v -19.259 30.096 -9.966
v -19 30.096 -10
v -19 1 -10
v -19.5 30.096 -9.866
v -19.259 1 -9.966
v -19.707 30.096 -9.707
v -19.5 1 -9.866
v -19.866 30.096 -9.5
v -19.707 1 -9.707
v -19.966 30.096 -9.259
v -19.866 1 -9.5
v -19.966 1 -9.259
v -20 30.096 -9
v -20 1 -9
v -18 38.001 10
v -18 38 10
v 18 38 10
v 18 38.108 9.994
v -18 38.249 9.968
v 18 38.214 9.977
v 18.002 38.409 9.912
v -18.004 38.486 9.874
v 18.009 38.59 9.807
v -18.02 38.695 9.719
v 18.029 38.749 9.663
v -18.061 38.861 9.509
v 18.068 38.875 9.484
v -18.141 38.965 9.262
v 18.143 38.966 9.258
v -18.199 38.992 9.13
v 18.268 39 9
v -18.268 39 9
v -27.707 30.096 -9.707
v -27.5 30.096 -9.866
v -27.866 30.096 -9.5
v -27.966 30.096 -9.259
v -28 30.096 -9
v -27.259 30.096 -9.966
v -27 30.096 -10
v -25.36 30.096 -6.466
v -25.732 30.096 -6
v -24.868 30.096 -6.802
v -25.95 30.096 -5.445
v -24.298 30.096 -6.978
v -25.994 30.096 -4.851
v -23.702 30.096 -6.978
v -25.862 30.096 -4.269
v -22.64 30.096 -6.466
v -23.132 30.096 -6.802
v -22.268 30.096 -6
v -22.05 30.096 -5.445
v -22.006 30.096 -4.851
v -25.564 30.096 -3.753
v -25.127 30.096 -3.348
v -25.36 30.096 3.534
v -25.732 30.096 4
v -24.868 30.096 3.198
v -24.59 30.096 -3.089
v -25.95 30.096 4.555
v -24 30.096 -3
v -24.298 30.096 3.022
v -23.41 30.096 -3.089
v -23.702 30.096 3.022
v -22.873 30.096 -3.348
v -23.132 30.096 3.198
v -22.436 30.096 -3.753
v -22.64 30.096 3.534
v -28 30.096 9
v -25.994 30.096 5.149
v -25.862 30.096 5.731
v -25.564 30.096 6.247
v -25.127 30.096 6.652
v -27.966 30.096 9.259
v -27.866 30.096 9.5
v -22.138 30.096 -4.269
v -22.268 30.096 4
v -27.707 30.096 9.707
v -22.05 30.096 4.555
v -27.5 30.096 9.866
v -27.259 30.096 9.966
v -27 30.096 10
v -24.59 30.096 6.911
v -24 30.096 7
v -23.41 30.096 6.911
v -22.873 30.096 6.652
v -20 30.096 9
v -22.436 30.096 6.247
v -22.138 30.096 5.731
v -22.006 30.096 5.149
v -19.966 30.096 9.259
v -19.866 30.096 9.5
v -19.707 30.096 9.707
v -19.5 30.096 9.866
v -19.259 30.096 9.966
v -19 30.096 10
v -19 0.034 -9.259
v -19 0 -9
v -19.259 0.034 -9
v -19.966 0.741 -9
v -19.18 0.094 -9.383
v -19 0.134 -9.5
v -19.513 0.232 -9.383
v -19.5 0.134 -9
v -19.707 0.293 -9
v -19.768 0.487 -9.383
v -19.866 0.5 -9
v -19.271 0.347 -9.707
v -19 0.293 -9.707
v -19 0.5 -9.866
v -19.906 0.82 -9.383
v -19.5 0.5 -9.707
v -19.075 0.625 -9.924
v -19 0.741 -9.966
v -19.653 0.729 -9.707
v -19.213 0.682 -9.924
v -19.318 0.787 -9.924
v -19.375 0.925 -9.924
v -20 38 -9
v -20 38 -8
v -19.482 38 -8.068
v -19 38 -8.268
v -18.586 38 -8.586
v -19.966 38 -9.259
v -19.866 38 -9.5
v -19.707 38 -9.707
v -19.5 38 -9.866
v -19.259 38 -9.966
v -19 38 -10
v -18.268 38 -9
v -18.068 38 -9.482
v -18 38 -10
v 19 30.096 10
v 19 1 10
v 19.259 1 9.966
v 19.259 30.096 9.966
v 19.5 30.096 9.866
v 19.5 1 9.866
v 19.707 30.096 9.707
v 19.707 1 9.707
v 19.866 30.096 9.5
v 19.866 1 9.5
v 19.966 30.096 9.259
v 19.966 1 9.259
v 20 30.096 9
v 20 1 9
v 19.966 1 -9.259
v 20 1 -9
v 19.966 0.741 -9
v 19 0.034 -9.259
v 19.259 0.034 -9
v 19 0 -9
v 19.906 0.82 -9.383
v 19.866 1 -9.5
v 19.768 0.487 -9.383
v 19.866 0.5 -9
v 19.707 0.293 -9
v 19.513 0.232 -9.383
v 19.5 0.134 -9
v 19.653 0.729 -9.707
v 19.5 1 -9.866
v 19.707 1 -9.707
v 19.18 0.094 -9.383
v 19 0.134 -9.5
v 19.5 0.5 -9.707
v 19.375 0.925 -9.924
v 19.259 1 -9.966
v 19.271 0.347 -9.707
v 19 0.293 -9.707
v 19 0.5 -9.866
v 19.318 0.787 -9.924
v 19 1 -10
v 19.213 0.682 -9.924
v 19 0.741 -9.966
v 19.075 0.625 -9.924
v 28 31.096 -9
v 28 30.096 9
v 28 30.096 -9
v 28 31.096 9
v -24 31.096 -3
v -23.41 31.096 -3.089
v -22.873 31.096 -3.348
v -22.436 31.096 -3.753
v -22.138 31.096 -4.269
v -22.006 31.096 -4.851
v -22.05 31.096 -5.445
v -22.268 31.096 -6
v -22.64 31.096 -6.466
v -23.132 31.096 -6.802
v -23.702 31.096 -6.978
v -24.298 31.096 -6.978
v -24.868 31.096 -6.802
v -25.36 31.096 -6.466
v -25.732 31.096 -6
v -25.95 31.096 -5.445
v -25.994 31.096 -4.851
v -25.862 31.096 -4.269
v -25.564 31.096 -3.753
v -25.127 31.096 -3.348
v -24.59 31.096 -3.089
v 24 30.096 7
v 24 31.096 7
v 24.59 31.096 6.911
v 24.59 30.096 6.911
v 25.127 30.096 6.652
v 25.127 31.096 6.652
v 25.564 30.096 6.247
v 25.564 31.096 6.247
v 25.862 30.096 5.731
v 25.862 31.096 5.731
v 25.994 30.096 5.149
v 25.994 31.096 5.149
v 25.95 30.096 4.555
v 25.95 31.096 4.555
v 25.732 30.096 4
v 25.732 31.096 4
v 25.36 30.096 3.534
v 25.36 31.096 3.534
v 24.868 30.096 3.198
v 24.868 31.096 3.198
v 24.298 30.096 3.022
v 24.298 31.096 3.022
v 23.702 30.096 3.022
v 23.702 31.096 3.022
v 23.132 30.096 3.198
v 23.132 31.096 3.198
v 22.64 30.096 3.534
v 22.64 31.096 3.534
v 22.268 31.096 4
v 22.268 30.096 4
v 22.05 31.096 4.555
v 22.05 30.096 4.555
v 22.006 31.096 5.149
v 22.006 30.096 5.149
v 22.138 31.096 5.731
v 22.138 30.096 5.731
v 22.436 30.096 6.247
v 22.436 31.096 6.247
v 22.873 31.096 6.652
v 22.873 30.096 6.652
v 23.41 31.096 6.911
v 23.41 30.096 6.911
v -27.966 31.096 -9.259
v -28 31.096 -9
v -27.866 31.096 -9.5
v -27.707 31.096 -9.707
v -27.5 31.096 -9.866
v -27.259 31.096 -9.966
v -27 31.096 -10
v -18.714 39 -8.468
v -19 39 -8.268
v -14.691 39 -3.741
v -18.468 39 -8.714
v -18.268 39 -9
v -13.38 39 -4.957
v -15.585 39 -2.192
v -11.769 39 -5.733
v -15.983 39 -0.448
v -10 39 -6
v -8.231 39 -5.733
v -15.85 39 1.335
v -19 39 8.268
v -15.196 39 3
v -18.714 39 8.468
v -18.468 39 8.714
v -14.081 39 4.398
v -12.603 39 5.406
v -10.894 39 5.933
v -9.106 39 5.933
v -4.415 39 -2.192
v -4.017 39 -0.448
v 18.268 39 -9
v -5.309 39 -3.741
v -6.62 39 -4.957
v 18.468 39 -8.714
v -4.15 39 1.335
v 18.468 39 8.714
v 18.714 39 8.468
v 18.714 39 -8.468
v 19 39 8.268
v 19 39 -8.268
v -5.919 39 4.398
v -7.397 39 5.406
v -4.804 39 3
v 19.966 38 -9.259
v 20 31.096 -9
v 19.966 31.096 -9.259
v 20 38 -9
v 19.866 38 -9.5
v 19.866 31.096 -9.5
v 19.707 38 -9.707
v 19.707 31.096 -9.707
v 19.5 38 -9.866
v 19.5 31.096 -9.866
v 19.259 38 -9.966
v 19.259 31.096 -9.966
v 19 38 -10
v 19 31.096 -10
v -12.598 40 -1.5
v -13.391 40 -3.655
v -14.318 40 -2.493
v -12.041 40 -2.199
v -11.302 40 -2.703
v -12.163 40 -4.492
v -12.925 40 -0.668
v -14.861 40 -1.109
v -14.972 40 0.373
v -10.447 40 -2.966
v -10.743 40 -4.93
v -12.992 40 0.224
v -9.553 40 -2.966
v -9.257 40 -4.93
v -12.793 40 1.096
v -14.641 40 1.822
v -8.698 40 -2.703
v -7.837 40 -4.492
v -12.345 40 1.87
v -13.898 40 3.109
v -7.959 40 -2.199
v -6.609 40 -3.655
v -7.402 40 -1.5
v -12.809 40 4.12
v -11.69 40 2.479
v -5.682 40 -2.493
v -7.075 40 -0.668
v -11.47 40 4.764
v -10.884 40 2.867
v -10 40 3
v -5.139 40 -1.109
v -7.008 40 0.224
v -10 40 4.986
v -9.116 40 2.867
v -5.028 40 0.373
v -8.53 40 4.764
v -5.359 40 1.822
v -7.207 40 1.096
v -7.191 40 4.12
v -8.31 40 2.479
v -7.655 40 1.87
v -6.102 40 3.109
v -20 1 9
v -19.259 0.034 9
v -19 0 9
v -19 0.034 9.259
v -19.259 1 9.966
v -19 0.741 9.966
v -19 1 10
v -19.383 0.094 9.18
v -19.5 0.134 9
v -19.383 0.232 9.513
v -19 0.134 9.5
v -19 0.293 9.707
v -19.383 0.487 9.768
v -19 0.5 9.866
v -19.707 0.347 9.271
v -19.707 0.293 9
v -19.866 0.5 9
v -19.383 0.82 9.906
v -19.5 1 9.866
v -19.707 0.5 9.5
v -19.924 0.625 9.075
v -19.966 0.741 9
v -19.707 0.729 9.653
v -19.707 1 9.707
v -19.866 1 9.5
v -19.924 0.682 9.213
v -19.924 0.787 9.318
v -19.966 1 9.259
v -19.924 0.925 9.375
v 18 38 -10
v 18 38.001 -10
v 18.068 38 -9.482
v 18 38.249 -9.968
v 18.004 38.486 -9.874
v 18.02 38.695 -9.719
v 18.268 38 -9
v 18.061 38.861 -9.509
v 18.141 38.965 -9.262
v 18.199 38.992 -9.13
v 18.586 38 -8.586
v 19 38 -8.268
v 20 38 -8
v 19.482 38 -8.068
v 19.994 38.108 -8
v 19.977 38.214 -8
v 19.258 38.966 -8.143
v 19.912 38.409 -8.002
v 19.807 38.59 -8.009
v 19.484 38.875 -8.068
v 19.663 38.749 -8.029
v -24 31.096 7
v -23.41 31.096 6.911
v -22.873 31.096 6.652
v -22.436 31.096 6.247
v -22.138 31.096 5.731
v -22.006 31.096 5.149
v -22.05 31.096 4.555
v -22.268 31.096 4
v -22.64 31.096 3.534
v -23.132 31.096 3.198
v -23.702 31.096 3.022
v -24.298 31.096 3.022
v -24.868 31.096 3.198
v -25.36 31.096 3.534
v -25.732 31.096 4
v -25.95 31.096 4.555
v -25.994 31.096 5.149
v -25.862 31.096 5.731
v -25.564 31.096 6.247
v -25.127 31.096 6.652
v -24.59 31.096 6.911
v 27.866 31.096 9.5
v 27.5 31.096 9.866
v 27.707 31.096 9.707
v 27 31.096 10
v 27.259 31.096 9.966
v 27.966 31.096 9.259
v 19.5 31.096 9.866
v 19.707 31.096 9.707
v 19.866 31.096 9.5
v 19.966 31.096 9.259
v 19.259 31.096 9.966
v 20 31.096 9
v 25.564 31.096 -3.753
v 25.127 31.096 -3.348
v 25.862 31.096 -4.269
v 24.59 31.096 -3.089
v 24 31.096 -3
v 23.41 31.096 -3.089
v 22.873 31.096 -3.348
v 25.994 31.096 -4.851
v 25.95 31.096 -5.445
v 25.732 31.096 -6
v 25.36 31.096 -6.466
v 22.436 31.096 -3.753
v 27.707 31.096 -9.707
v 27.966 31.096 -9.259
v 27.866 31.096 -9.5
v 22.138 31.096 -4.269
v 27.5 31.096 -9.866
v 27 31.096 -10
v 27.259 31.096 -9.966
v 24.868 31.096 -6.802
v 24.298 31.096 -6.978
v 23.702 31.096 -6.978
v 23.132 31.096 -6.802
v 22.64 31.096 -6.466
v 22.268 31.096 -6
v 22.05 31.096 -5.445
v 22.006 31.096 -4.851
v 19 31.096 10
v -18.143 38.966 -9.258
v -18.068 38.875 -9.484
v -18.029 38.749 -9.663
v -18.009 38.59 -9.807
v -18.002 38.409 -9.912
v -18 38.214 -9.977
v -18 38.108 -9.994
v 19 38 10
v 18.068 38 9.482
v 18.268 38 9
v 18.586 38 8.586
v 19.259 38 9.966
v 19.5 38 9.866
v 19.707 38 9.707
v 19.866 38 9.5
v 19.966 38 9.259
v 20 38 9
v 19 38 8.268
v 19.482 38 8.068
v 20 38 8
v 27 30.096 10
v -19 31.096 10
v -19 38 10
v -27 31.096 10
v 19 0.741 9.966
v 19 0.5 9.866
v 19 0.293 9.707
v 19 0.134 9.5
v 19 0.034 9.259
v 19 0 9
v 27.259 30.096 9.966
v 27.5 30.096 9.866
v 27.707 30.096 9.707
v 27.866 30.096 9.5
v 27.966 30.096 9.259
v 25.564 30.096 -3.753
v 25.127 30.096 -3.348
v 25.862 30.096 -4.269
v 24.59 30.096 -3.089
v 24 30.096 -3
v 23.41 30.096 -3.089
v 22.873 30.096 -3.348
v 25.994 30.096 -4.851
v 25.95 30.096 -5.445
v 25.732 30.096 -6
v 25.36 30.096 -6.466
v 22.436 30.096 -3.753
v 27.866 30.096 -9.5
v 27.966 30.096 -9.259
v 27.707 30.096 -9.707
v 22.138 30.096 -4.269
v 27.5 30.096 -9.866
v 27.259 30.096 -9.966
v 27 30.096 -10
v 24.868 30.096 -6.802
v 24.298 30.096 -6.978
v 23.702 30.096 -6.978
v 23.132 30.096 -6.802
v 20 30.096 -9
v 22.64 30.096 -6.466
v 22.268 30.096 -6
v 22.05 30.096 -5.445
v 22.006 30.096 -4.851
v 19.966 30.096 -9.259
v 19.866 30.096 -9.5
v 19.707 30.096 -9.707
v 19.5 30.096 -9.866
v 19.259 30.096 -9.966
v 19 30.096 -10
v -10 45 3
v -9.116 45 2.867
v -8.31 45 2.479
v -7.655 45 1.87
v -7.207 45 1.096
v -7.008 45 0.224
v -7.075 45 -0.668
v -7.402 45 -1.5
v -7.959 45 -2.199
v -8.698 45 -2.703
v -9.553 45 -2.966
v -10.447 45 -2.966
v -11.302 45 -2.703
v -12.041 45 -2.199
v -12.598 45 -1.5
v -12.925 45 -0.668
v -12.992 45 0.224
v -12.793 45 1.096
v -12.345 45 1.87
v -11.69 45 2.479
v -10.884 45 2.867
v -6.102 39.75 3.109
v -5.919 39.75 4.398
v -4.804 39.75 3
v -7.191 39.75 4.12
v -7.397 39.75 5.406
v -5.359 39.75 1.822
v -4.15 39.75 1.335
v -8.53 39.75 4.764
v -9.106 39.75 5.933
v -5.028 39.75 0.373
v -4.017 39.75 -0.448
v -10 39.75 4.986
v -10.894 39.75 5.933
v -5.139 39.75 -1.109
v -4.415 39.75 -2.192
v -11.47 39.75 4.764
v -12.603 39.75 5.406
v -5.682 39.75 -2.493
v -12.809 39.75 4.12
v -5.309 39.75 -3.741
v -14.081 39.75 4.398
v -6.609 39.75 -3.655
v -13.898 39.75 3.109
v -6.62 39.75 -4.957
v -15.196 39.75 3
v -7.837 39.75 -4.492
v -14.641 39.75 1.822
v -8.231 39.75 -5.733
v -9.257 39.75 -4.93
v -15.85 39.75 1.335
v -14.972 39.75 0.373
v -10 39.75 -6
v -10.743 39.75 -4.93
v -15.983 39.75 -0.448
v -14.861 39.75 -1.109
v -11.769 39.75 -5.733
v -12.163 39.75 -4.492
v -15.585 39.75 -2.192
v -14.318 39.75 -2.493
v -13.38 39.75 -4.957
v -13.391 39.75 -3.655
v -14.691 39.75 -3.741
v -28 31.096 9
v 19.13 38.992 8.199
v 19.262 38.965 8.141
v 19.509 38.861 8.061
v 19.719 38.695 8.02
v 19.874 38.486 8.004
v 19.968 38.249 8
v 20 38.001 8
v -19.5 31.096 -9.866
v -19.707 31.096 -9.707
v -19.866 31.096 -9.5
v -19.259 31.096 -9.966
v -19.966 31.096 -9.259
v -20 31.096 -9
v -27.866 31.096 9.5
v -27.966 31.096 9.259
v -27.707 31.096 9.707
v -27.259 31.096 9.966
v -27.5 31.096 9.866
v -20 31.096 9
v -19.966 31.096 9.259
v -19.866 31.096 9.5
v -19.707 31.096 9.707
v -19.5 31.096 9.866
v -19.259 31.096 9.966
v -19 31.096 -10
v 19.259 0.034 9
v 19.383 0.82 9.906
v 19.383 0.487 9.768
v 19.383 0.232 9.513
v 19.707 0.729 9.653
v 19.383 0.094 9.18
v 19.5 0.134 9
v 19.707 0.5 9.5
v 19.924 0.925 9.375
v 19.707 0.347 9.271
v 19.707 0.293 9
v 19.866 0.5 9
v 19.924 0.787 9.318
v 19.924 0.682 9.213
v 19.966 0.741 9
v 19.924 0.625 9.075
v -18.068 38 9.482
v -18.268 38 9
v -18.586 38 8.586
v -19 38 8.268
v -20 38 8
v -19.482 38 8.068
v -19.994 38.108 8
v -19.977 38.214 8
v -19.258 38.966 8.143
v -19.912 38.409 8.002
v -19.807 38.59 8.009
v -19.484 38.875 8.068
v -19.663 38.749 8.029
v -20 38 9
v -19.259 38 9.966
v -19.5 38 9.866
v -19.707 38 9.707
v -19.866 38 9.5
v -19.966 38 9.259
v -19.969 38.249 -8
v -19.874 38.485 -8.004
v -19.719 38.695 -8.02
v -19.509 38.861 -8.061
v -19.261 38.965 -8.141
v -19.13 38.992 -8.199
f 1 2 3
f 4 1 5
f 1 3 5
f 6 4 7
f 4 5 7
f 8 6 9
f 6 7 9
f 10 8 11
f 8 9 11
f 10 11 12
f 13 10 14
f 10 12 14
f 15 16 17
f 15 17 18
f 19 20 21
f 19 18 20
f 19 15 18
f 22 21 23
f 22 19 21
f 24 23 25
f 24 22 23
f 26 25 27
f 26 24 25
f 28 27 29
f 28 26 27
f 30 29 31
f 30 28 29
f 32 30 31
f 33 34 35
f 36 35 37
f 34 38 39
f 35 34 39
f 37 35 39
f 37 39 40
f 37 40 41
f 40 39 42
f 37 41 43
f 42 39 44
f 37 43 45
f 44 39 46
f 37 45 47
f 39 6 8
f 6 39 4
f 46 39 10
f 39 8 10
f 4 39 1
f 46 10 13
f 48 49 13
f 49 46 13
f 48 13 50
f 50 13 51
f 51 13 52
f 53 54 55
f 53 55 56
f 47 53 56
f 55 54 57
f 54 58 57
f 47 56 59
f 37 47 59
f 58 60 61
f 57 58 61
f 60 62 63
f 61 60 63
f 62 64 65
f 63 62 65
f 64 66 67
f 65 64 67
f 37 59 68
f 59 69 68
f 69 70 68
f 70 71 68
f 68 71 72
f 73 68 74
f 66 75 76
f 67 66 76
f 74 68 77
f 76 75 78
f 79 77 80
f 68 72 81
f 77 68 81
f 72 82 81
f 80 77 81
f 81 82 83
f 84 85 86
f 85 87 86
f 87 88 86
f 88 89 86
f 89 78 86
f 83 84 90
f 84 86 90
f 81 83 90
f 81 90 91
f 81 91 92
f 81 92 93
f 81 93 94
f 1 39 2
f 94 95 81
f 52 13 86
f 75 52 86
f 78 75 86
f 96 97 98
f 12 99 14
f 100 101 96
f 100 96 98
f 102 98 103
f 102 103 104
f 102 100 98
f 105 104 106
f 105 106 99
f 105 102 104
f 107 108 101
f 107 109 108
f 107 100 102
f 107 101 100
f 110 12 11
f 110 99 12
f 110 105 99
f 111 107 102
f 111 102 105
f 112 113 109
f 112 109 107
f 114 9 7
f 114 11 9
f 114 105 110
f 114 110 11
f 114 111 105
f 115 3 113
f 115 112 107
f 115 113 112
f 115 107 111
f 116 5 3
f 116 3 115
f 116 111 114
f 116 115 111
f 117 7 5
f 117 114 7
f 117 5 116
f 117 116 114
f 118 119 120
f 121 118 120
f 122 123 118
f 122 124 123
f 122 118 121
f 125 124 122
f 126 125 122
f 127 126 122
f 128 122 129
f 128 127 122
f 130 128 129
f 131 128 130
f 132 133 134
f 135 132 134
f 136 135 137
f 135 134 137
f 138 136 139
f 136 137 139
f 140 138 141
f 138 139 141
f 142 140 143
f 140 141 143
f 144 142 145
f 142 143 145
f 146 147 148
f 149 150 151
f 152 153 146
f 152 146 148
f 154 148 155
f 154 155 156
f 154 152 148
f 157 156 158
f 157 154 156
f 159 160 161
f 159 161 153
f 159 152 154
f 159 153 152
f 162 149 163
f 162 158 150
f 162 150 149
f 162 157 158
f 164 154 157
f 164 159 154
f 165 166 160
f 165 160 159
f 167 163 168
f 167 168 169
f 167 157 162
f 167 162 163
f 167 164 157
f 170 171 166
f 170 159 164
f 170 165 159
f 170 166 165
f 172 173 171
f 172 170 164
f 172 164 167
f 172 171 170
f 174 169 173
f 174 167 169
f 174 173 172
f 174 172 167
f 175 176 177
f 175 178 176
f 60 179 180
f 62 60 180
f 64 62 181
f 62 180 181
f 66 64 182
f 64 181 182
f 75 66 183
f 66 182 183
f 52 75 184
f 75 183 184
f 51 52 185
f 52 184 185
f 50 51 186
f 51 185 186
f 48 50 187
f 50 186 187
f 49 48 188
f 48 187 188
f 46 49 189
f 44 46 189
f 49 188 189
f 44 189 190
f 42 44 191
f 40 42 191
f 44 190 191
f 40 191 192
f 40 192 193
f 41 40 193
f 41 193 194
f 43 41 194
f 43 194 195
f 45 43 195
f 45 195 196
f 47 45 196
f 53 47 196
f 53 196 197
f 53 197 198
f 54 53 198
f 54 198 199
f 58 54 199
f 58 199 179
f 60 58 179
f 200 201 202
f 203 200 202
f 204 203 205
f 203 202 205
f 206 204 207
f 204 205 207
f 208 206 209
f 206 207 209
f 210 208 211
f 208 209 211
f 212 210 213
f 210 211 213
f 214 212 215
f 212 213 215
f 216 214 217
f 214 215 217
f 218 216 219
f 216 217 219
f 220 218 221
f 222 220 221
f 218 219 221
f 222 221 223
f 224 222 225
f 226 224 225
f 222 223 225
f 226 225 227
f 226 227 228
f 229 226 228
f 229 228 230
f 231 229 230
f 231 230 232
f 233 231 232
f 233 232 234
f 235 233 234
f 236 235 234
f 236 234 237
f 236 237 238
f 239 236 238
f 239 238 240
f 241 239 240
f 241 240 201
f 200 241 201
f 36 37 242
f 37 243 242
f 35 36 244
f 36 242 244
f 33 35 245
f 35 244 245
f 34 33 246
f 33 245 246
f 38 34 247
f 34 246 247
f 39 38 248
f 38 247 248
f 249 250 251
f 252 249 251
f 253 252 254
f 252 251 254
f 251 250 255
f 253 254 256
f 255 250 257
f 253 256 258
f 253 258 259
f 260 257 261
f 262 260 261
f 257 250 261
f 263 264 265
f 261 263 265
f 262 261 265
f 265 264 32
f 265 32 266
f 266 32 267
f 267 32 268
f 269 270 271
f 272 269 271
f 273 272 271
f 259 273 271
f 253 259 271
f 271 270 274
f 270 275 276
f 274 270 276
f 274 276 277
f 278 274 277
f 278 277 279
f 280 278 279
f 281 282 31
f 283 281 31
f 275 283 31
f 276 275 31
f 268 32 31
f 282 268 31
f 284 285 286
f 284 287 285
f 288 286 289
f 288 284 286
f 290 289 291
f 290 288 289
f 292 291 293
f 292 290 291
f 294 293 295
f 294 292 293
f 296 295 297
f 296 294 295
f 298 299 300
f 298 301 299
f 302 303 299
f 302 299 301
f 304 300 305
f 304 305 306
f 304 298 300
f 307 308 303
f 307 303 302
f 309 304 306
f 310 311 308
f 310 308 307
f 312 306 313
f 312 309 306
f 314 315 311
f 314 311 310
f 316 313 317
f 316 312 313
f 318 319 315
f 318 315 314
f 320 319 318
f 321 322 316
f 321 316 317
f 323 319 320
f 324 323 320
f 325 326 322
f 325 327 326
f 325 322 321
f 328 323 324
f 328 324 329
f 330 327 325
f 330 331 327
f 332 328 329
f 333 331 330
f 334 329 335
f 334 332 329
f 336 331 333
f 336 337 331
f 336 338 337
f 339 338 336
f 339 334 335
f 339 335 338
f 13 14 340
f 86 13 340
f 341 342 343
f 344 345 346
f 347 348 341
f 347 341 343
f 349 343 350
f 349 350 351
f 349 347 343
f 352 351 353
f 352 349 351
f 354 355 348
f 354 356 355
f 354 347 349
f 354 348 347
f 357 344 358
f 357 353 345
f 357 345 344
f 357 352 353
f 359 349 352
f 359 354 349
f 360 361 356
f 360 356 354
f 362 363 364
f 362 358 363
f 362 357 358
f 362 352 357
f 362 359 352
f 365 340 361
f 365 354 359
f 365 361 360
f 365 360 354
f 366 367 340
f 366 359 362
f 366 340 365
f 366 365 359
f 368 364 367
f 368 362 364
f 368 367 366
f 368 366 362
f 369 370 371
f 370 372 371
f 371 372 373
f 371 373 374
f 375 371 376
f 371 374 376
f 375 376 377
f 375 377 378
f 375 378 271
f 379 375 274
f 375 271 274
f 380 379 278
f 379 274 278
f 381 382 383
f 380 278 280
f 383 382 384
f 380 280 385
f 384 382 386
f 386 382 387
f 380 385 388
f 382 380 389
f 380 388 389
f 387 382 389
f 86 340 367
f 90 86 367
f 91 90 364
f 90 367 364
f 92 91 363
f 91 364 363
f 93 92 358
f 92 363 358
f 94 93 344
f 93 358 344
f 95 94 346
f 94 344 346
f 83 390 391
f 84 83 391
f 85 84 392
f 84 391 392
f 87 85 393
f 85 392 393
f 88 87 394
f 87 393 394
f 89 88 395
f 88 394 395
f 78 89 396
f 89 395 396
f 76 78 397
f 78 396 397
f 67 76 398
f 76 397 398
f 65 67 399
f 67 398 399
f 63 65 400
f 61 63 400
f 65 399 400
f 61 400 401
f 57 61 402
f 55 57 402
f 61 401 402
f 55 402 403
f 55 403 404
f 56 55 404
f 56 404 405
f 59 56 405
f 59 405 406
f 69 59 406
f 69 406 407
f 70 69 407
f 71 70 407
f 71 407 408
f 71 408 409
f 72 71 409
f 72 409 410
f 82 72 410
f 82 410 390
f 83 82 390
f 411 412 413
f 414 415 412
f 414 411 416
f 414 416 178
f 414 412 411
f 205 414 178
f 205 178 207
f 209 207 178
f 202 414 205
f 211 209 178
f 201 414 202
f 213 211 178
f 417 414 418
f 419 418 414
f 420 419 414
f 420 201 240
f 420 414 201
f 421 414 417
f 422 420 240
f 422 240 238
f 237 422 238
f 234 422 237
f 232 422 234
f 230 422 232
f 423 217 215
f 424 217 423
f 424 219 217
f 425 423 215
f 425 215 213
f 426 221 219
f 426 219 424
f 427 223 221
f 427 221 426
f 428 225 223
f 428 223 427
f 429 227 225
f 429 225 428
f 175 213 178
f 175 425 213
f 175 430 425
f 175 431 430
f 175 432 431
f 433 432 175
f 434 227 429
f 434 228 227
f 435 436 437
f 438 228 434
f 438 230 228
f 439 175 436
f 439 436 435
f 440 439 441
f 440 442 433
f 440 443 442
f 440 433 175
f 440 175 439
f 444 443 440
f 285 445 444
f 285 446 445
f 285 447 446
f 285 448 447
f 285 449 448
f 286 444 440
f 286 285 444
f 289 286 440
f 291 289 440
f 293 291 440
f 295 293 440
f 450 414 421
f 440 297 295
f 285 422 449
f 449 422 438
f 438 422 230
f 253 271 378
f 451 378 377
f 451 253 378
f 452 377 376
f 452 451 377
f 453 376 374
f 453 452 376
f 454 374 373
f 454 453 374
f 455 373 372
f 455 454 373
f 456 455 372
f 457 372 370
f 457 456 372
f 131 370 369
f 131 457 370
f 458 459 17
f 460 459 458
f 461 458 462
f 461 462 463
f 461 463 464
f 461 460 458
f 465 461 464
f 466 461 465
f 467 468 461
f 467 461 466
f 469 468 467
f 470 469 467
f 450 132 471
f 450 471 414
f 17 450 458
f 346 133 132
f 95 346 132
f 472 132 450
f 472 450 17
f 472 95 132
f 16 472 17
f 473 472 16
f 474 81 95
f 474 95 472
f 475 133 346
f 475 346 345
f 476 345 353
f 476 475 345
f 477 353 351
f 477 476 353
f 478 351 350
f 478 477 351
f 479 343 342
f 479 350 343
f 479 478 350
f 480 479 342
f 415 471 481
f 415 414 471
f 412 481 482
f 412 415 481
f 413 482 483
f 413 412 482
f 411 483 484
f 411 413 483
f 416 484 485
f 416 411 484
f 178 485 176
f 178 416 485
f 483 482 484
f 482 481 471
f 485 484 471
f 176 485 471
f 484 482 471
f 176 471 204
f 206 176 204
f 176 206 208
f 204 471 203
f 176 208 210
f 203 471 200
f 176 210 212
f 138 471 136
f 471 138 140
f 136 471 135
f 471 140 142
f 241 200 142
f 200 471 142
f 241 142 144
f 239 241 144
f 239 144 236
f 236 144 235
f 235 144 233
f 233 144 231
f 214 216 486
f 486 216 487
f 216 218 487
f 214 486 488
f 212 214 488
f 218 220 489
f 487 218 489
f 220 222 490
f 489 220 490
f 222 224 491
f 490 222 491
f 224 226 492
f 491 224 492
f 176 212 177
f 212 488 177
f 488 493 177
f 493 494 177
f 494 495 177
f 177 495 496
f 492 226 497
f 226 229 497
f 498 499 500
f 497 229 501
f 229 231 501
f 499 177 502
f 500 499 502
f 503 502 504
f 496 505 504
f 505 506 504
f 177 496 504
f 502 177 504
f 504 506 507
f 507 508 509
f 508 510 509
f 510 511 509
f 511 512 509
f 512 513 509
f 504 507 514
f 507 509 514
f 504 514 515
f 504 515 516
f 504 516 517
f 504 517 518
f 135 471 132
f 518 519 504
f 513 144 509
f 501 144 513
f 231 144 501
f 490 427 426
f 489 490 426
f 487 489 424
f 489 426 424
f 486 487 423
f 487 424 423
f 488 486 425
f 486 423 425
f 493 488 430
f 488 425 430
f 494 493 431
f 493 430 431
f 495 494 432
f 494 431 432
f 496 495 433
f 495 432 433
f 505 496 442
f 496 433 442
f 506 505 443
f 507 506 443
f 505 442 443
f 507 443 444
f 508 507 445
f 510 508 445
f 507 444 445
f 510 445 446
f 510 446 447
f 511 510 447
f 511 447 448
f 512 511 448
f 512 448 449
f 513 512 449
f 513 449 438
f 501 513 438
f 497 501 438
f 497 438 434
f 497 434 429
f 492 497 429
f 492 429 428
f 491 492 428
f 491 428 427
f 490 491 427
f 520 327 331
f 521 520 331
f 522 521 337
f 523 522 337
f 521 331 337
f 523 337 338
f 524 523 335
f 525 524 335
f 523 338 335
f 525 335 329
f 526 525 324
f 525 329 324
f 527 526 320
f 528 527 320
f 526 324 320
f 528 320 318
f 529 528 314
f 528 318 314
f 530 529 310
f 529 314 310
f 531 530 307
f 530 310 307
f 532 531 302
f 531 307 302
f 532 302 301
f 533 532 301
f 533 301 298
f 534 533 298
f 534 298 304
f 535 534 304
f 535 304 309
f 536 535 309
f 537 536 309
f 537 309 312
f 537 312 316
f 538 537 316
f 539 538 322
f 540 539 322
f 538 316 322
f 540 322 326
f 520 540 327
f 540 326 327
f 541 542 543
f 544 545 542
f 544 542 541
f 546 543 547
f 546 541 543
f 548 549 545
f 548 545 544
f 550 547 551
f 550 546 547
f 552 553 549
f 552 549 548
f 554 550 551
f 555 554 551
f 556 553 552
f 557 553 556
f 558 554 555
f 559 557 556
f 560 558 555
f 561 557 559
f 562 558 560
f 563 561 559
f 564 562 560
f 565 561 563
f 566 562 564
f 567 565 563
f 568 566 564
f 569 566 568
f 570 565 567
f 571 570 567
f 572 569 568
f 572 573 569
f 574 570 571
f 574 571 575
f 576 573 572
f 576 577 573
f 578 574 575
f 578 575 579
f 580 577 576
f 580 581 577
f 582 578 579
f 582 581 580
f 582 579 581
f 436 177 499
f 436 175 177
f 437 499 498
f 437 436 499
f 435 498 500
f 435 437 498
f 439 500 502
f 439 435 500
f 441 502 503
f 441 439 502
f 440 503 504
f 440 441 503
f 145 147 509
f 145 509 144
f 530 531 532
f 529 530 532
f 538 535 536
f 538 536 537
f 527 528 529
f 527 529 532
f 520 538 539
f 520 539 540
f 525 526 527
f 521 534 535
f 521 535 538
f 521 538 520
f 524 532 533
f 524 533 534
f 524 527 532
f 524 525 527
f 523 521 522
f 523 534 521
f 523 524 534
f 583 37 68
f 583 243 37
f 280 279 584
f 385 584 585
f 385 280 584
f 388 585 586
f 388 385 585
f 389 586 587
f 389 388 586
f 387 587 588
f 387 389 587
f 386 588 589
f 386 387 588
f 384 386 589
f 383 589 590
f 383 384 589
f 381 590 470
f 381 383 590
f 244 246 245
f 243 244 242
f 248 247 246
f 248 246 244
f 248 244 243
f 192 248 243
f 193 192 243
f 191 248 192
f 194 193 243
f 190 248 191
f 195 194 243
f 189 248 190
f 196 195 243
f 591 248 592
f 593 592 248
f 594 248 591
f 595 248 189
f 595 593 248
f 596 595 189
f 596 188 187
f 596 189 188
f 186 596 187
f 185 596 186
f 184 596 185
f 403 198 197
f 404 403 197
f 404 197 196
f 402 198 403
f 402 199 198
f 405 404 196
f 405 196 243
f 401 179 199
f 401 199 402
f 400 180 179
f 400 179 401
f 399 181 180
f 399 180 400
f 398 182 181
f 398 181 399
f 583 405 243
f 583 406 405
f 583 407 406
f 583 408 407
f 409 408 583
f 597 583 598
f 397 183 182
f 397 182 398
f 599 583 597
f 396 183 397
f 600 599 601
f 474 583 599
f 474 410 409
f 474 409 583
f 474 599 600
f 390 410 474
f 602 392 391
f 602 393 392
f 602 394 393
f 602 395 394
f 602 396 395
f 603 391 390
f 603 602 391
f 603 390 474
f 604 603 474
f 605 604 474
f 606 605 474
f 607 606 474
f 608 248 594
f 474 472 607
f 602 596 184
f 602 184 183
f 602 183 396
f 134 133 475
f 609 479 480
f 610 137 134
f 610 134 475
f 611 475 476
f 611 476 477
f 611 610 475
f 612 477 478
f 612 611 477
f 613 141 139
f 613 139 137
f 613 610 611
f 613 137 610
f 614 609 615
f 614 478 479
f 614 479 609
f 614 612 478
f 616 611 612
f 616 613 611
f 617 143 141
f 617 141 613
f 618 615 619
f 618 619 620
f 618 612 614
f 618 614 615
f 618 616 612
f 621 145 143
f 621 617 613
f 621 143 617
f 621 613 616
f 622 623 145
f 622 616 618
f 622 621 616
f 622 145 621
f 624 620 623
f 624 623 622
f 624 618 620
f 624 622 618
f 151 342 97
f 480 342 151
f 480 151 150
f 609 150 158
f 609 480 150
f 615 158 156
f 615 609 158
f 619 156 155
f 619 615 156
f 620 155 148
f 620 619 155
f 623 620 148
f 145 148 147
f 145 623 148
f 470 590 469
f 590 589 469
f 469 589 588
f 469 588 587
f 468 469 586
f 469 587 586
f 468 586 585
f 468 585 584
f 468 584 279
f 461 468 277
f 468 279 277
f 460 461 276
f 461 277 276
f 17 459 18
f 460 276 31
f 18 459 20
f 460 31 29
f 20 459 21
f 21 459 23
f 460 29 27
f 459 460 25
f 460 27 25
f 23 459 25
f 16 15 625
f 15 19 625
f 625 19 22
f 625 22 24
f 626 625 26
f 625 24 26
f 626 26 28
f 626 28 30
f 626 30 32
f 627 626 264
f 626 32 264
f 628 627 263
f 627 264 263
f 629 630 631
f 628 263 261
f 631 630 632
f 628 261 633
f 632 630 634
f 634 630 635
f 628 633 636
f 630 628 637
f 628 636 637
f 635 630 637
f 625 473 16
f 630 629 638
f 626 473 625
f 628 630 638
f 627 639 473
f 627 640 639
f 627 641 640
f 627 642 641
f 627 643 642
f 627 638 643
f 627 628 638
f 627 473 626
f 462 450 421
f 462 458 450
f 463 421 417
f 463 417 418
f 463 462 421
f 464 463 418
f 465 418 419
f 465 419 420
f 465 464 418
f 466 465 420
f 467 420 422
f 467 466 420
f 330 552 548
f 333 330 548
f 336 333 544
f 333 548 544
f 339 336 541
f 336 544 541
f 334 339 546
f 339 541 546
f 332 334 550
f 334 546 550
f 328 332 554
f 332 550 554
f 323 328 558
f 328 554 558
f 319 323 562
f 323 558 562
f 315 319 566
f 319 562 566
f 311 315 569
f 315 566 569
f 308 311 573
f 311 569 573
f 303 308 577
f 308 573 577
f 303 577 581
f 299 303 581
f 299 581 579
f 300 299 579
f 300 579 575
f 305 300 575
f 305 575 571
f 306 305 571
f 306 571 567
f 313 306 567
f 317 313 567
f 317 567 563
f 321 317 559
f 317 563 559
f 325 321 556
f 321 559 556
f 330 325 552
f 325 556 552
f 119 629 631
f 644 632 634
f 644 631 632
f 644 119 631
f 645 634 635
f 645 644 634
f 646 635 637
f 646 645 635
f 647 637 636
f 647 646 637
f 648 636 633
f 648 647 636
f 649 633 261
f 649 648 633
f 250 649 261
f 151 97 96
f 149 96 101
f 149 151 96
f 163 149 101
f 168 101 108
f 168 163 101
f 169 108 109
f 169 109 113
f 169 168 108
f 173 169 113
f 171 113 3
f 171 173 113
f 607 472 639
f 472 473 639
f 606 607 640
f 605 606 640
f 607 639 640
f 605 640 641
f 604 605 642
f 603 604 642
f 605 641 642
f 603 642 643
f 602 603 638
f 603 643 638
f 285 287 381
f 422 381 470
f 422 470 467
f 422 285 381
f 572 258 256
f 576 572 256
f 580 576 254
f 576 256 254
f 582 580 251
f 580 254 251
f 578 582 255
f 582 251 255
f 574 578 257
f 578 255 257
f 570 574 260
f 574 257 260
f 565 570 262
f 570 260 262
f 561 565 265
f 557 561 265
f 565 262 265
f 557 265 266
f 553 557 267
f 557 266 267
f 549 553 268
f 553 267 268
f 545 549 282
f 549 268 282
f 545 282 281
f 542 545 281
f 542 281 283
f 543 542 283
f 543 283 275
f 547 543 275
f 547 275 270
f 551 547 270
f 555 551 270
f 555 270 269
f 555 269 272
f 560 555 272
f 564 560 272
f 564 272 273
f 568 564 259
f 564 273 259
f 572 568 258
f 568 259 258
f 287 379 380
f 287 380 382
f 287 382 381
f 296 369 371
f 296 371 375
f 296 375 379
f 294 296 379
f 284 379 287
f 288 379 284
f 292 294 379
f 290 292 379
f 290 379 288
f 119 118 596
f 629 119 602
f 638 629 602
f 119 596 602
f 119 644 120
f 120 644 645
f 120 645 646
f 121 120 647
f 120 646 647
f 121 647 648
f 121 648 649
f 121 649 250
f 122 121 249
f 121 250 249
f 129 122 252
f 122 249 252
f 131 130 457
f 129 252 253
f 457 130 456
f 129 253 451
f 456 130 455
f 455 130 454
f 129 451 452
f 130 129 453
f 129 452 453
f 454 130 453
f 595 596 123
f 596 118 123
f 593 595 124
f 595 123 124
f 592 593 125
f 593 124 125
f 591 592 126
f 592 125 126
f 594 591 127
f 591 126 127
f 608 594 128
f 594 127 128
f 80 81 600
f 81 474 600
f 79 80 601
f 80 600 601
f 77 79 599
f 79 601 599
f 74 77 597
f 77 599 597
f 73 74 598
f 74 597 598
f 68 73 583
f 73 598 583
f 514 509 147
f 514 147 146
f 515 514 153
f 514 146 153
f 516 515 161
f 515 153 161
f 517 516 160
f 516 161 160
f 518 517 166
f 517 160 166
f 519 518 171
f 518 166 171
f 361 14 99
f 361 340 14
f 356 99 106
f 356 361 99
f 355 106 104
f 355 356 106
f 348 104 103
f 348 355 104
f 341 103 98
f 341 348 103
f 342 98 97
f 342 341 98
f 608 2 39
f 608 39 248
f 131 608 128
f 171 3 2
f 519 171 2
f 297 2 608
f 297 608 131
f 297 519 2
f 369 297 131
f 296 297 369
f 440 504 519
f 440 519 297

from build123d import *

# Parameters (mm, degrees)
SKETCH_1_W          = 40
SKETCH_1_H          = 10
EXTRUDE_2_DEPTH     = 39
SKETCH_4_W          = 10
SKETCH_4_H          = 1
EXTRUDE_8_DEPTH     = 8
SKETCH_12_W         = 10
SKETCH_12_H         = 1
EXTRUDE_9_DEPTH     = 8
SKETCH_14_W         = 40
SKETCH_14_H         = 20
EXTRUDE_10_DEPTH    = 39
SKETCH_15_W         = 20
SKETCH_15_H         = 1
EXTRUDE_12_DEPTH    = 8
SKETCH_16_W         = 20
SKETCH_16_H         = 1
EXTRUDE_13_DEPTH    = 8
SKETCH_17_R         = 6
EXTRUDE_15_DEPTH    = 0.75
SKETCH_19_R         = 4.98600358
EXTRUDE_16_DEPTH    = 0.25
SKETCH_20_R         = 3
EXTRUDE_17_DEPTH    = 5
SKETCH_22_R         = 2
CUT_EXTRUDE_1_DEPTH = 5
SKETCH_23_R         = 2
CUT_EXTRUDE_3_DEPTH = 5
FILLET_12_R         = 1
FILLET_13_R         = 1
SKETCH_27_R         = 2
CUT_EXTRUDE_4_DEPTH = 1
FILLET_14_R         = 1
FILLET_START        = -9
FILLET_15_DEPTH     = 18
FILLET_START_2      = -19.678632008
FILLET_15_2_DEPTH   = 39.357264016
FILLET_16_R         = 1


with BuildPart() as part:
    # 草图1 → 凸台-拉伸2 (new body)
    with BuildSketch(Plane(origin=(0, 0, 0), x_dir=(1, 0, 0), z_dir=(0, 1, 0))):
        Rectangle(SKETCH_1_W, SKETCH_1_H)
    extrude(amount=EXTRUDE_2_DEPTH)

    # 草图4 → 凸台-拉伸8 (add)
    with BuildSketch(Plane.ZY.offset(20)):
        with Locations((0, 30.596439846)):
            Rectangle(SKETCH_4_W, SKETCH_4_H)
    extrude(amount=EXTRUDE_8_DEPTH)

    # 草图12 → 凸台-拉伸9 (add)
    with BuildSketch(Plane(origin=(20, 0, 0), x_dir=(0, 0, -1), z_dir=(1, 0, 0))):
        with Locations((0, 30.596439846)):
            Rectangle(SKETCH_12_W, SKETCH_12_H)
    extrude(amount=EXTRUDE_9_DEPTH)

    # 草图14 → 凸台-拉伸10 (add)
    with BuildSketch(Plane.XZ):
        Rectangle(SKETCH_14_W, SKETCH_14_H)
    extrude(amount=-EXTRUDE_10_DEPTH)

    # 草图15 → 凸台-拉伸12 (add)
    with BuildSketch(Plane.ZY.offset(20)):
        with Locations((0, 30.596439846)):
            Rectangle(SKETCH_15_W, SKETCH_15_H)
    extrude(amount=EXTRUDE_12_DEPTH)

    # 草图16 → 凸台-拉伸13 (add)
    with BuildSketch(Plane(origin=(20, 0, 0), x_dir=(0, 0, -1), z_dir=(1, 0, 0))):
        with Locations((0, 30.596439846)):
            Rectangle(SKETCH_16_W, SKETCH_16_H)
    extrude(amount=EXTRUDE_13_DEPTH)

    # 草图17 → 凸台-拉伸15 (add)
    with BuildSketch(Plane(origin=(0, 39, 0), x_dir=(1, 0, 0), z_dir=(0, 1, 0))):
        with Locations(Location((-10, 0, 0), (0, 0, 90))):
            Circle(SKETCH_17_R)
    extrude(amount=EXTRUDE_15_DEPTH)

    # 草图19 → 凸台-拉伸16 (add)
    with BuildSketch(Plane(origin=(0, 39.75, 0), x_dir=(1, 0, 0), z_dir=(0, 1, 0))):
        with Locations(Location((-10, 0, 0), (0, 0, 270))):
            Circle(SKETCH_19_R)
    extrude(amount=EXTRUDE_16_DEPTH)

    # 草图20 → 凸台-拉伸17 (add)
    with BuildSketch(Plane(origin=(0, 40, 0), x_dir=(1, 0, 0), z_dir=(0, 1, 0))):
        with Locations(Location((-10, 0, 0), (0, 0, 270))):
            Circle(SKETCH_20_R)
    extrude(amount=EXTRUDE_17_DEPTH)

    # 草图22 → 切除-拉伸1 (cut)
    with BuildSketch(Plane(origin=(0, 31.096439846, 0), x_dir=(1, 0, 0), z_dir=(0, 1, 0))):
        with Locations(Location((-24, 5, 0), (0, 0, 270))):
            Circle(SKETCH_22_R)
        with Locations(Location((-24, -5, 0), (0, 0, 270))):
            Circle(SKETCH_22_R)
    extrude(amount=-CUT_EXTRUDE_1_DEPTH, mode=Mode.SUBTRACT)

    # 草图23 → 切除-拉伸3 (cut)
    with BuildSketch(Plane(origin=(0, 31.096439846, 0), x_dir=(1, 0, 0), z_dir=(0, 1, 0))):
        with Locations(Location((24, 5, 0), (0, 0, 270))):
            Circle(SKETCH_23_R)
        with Locations(Location((24, -5, 0), (0, 0, 270))):
            Circle(SKETCH_23_R)
    extrude(amount=-CUT_EXTRUDE_3_DEPTH, mode=Mode.SUBTRACT)

    # 圆角12
    fillet_12_edges = [part.edges().sort_by_distance(p)[0] for p in [
        (0, 0, -10),
        (0, 0, 10),
        (-20, 0, 0),
        (20, 0, 0),
    ]]
    fillet(fillet_12_edges, radius=FILLET_12_R)

    # 圆角13
    # the kernel refuses this fillet: 1 mm, written as the material it takes off along each edge
    with BuildSketch(Plane(origin=(19, 1, -9), x_dir=(1, 0, 0), z_dir=(0, 0, -1))) as fillet_13_piece_1_section:
        Polygon((0, 0), (FILLET_13_R * 1.02, 0), (FILLET_13_R * 1.02, FILLET_13_R * 1.02), (0, FILLET_13_R * 1.02), align=None)
    fillet_13_piece_1 = extrude(amount=FILLET_13_R * 1.02, mode=Mode.PRIVATE)
    fillet_13_piece_1 = fillet_13_piece_1 - Plane(origin=(19, 1, -9), x_dir=(-0.7071067811865475, 0.7071067811865475, 0), z_dir=(0, 0, -1)) * Sphere(FILLET_13_R, mode=Mode.PRIVATE)
    add(fillet_13_piece_1, mode=Mode.SUBTRACT)
    with BuildSketch(Plane(origin=(19, 1, 9), x_dir=(0, 0, 1), z_dir=(1, 0, 0))) as fillet_13_piece_2_section:
        Polygon((0, 0), (FILLET_13_R * 1.02, 0), (FILLET_13_R * 1.02, FILLET_13_R * 1.02), (0, FILLET_13_R * 1.02), align=None)
    fillet_13_piece_2 = extrude(amount=FILLET_13_R * 1.02, mode=Mode.PRIVATE)
    fillet_13_piece_2 = fillet_13_piece_2 - Plane(origin=(19, 1, 9), x_dir=(0, 0.7071067811865475, -0.7071067811865475), z_dir=(1, 0, 0)) * Sphere(FILLET_13_R, mode=Mode.PRIVATE)
    add(fillet_13_piece_2, mode=Mode.SUBTRACT)
    with BuildSketch(Plane(origin=(-19, 1, -9), x_dir=(-1, 0, 0), z_dir=(0, 0, -1))) as fillet_13_piece_3_section:
        Polygon((0, 0), (FILLET_13_R * 1.02, 0), (FILLET_13_R * 1.02, -FILLET_13_R * 1.02), (0, -FILLET_13_R * 1.02), align=None)
    fillet_13_piece_3 = extrude(amount=FILLET_13_R * 1.02, mode=Mode.PRIVATE)
    fillet_13_piece_3 = fillet_13_piece_3 - Plane(origin=(-19, 1, -9), x_dir=(0.7071067811865475, 0.7071067811865475, 0), z_dir=(0, 0, -1)) * Sphere(FILLET_13_R, mode=Mode.PRIVATE)
    add(fillet_13_piece_3, mode=Mode.SUBTRACT)
    with BuildSketch(Plane(origin=(-19, 1, 9), x_dir=(0, 0, 1), z_dir=(-1, 0, 0))) as fillet_13_piece_4_section:
        Polygon((0, 0), (FILLET_13_R * 1.02, 0), (FILLET_13_R * 1.02, -FILLET_13_R * 1.02), (0, -FILLET_13_R * 1.02), align=None)
    fillet_13_piece_4 = extrude(amount=FILLET_13_R * 1.02, mode=Mode.PRIVATE)
    fillet_13_piece_4 = fillet_13_piece_4 - Plane(origin=(-19, 1, 9), x_dir=(0, 0.7071067811865475, -0.7071067811865475), z_dir=(-1, 0, 0)) * Sphere(FILLET_13_R, mode=Mode.PRIVATE)
    add(fillet_13_piece_4, mode=Mode.SUBTRACT)
    with BuildSketch(Plane(origin=(-20, 1, -10), x_dir=(1, 0, 0), z_dir=(0, 1, 0)), Plane(origin=(-20, 1, 10), x_dir=(0, 0, -1), z_dir=(0, 1, 0))) as fillet_13_piece_5:
        with BuildLine():
            CenterArc((FILLET_13_R, -FILLET_13_R), FILLET_13_R, 90, 90)
            Line((0, -FILLET_13_R), (0, 0))
            Line((0, 0), (FILLET_13_R, 0))
        make_face()
    extrude(amount=29.096439846, mode=Mode.SUBTRACT)
    with BuildSketch(Plane(origin=(20, 1, -10), x_dir=(-1, 0, 0), z_dir=(0, 1, 0)), Plane(origin=(20, 1, 10), x_dir=(0, 0, -1), z_dir=(0, 1, 0))) as fillet_13_piece_6:
        with BuildLine():
            CenterArc((FILLET_13_R, FILLET_13_R), FILLET_13_R, 180, 90)
            Line((0, FILLET_13_R), (0, 0))
            Line((0, 0), (FILLET_13_R, 0))
        make_face()
    extrude(amount=29.096439846, mode=Mode.SUBTRACT)

    # 草图27 → 切除-拉伸4 (cut)
    with BuildSketch(Plane(origin=(0, 39, 0), x_dir=(1, 0, 0), z_dir=(0, 1, 0))):
        with Locations((-20, 10)):
            Circle(SKETCH_27_R)
        with Locations((20, 10)):
            Circle(SKETCH_27_R)
        with Locations((20, -10)):
            Circle(SKETCH_27_R)
        with Locations((-20, -10)):
            Circle(SKETCH_27_R)
    extrude(amount=-CUT_EXTRUDE_4_DEPTH, mode=Mode.SUBTRACT)

    # 圆角14
    fillet_14_edges = [part.edges().sort_by_distance(p)[0] for p in [
        (-20, 34.548219923, -10),
        (20, 34.548219923, -10),
        (20, 34.548219923, 10),
        (-20, 34.548219923, 10),
    ]]
    fillet(fillet_14_edges, radius=FILLET_14_R)

    # 圆角15: read off the stored shape, not the designer's step
    # 圆角15 outline → 圆角15 (cut)
    with BuildSketch(Plane.XY.offset(FILLET_START)):
        with BuildLine():
            Line((20, 39), (19, 39))
            ThreePointArc((19, 39), (19.707106781, 38.707106781), (20, 38))
            Line((20, 38), (20, 39))
        make_face()
        with BuildLine():
            ThreePointArc((-20, 38), (-19.707106781, 38.707106781), (-19, 39))
            Line((-19, 39), (-20, 39))
            Line((-20, 39), (-20, 38))
        make_face()
    extrude(amount=FILLET_15_DEPTH, mode=Mode.SUBTRACT)

    # Fillet 15 2 outline → Fillet 15 2 (cut)
    with BuildSketch(Plane.YZ.offset(FILLET_START_2)):
        with BuildLine():
            Line((39, -10), (39, -9))
            ThreePointArc((39, -9), (38.707106781, -9.707106781), (38, -10))
            Line((38, -10), (39, -10))
        make_face()
        with BuildLine():
            ThreePointArc((38, 10), (38.707106781, 9.707106781), (39, 9))
            Line((39, 9), (39, 10))
            Line((39, 10), (38, 10))
        make_face()
    extrude(amount=FILLET_15_2_DEPTH, mode=Mode.SUBTRACT)

    # 圆角16
    fillet_16_edges = [part.edges().sort_by_distance(p)[0] for p in [
        (28, 30.596439846, -10),
        (28, 30.596439846, 10),
        (-28, 30.596439846, -10),
        (-28, 30.596439846, 10),
    ]]
    fillet(fillet_16_edges, radius=FILLET_16_R)


solid = part.part
